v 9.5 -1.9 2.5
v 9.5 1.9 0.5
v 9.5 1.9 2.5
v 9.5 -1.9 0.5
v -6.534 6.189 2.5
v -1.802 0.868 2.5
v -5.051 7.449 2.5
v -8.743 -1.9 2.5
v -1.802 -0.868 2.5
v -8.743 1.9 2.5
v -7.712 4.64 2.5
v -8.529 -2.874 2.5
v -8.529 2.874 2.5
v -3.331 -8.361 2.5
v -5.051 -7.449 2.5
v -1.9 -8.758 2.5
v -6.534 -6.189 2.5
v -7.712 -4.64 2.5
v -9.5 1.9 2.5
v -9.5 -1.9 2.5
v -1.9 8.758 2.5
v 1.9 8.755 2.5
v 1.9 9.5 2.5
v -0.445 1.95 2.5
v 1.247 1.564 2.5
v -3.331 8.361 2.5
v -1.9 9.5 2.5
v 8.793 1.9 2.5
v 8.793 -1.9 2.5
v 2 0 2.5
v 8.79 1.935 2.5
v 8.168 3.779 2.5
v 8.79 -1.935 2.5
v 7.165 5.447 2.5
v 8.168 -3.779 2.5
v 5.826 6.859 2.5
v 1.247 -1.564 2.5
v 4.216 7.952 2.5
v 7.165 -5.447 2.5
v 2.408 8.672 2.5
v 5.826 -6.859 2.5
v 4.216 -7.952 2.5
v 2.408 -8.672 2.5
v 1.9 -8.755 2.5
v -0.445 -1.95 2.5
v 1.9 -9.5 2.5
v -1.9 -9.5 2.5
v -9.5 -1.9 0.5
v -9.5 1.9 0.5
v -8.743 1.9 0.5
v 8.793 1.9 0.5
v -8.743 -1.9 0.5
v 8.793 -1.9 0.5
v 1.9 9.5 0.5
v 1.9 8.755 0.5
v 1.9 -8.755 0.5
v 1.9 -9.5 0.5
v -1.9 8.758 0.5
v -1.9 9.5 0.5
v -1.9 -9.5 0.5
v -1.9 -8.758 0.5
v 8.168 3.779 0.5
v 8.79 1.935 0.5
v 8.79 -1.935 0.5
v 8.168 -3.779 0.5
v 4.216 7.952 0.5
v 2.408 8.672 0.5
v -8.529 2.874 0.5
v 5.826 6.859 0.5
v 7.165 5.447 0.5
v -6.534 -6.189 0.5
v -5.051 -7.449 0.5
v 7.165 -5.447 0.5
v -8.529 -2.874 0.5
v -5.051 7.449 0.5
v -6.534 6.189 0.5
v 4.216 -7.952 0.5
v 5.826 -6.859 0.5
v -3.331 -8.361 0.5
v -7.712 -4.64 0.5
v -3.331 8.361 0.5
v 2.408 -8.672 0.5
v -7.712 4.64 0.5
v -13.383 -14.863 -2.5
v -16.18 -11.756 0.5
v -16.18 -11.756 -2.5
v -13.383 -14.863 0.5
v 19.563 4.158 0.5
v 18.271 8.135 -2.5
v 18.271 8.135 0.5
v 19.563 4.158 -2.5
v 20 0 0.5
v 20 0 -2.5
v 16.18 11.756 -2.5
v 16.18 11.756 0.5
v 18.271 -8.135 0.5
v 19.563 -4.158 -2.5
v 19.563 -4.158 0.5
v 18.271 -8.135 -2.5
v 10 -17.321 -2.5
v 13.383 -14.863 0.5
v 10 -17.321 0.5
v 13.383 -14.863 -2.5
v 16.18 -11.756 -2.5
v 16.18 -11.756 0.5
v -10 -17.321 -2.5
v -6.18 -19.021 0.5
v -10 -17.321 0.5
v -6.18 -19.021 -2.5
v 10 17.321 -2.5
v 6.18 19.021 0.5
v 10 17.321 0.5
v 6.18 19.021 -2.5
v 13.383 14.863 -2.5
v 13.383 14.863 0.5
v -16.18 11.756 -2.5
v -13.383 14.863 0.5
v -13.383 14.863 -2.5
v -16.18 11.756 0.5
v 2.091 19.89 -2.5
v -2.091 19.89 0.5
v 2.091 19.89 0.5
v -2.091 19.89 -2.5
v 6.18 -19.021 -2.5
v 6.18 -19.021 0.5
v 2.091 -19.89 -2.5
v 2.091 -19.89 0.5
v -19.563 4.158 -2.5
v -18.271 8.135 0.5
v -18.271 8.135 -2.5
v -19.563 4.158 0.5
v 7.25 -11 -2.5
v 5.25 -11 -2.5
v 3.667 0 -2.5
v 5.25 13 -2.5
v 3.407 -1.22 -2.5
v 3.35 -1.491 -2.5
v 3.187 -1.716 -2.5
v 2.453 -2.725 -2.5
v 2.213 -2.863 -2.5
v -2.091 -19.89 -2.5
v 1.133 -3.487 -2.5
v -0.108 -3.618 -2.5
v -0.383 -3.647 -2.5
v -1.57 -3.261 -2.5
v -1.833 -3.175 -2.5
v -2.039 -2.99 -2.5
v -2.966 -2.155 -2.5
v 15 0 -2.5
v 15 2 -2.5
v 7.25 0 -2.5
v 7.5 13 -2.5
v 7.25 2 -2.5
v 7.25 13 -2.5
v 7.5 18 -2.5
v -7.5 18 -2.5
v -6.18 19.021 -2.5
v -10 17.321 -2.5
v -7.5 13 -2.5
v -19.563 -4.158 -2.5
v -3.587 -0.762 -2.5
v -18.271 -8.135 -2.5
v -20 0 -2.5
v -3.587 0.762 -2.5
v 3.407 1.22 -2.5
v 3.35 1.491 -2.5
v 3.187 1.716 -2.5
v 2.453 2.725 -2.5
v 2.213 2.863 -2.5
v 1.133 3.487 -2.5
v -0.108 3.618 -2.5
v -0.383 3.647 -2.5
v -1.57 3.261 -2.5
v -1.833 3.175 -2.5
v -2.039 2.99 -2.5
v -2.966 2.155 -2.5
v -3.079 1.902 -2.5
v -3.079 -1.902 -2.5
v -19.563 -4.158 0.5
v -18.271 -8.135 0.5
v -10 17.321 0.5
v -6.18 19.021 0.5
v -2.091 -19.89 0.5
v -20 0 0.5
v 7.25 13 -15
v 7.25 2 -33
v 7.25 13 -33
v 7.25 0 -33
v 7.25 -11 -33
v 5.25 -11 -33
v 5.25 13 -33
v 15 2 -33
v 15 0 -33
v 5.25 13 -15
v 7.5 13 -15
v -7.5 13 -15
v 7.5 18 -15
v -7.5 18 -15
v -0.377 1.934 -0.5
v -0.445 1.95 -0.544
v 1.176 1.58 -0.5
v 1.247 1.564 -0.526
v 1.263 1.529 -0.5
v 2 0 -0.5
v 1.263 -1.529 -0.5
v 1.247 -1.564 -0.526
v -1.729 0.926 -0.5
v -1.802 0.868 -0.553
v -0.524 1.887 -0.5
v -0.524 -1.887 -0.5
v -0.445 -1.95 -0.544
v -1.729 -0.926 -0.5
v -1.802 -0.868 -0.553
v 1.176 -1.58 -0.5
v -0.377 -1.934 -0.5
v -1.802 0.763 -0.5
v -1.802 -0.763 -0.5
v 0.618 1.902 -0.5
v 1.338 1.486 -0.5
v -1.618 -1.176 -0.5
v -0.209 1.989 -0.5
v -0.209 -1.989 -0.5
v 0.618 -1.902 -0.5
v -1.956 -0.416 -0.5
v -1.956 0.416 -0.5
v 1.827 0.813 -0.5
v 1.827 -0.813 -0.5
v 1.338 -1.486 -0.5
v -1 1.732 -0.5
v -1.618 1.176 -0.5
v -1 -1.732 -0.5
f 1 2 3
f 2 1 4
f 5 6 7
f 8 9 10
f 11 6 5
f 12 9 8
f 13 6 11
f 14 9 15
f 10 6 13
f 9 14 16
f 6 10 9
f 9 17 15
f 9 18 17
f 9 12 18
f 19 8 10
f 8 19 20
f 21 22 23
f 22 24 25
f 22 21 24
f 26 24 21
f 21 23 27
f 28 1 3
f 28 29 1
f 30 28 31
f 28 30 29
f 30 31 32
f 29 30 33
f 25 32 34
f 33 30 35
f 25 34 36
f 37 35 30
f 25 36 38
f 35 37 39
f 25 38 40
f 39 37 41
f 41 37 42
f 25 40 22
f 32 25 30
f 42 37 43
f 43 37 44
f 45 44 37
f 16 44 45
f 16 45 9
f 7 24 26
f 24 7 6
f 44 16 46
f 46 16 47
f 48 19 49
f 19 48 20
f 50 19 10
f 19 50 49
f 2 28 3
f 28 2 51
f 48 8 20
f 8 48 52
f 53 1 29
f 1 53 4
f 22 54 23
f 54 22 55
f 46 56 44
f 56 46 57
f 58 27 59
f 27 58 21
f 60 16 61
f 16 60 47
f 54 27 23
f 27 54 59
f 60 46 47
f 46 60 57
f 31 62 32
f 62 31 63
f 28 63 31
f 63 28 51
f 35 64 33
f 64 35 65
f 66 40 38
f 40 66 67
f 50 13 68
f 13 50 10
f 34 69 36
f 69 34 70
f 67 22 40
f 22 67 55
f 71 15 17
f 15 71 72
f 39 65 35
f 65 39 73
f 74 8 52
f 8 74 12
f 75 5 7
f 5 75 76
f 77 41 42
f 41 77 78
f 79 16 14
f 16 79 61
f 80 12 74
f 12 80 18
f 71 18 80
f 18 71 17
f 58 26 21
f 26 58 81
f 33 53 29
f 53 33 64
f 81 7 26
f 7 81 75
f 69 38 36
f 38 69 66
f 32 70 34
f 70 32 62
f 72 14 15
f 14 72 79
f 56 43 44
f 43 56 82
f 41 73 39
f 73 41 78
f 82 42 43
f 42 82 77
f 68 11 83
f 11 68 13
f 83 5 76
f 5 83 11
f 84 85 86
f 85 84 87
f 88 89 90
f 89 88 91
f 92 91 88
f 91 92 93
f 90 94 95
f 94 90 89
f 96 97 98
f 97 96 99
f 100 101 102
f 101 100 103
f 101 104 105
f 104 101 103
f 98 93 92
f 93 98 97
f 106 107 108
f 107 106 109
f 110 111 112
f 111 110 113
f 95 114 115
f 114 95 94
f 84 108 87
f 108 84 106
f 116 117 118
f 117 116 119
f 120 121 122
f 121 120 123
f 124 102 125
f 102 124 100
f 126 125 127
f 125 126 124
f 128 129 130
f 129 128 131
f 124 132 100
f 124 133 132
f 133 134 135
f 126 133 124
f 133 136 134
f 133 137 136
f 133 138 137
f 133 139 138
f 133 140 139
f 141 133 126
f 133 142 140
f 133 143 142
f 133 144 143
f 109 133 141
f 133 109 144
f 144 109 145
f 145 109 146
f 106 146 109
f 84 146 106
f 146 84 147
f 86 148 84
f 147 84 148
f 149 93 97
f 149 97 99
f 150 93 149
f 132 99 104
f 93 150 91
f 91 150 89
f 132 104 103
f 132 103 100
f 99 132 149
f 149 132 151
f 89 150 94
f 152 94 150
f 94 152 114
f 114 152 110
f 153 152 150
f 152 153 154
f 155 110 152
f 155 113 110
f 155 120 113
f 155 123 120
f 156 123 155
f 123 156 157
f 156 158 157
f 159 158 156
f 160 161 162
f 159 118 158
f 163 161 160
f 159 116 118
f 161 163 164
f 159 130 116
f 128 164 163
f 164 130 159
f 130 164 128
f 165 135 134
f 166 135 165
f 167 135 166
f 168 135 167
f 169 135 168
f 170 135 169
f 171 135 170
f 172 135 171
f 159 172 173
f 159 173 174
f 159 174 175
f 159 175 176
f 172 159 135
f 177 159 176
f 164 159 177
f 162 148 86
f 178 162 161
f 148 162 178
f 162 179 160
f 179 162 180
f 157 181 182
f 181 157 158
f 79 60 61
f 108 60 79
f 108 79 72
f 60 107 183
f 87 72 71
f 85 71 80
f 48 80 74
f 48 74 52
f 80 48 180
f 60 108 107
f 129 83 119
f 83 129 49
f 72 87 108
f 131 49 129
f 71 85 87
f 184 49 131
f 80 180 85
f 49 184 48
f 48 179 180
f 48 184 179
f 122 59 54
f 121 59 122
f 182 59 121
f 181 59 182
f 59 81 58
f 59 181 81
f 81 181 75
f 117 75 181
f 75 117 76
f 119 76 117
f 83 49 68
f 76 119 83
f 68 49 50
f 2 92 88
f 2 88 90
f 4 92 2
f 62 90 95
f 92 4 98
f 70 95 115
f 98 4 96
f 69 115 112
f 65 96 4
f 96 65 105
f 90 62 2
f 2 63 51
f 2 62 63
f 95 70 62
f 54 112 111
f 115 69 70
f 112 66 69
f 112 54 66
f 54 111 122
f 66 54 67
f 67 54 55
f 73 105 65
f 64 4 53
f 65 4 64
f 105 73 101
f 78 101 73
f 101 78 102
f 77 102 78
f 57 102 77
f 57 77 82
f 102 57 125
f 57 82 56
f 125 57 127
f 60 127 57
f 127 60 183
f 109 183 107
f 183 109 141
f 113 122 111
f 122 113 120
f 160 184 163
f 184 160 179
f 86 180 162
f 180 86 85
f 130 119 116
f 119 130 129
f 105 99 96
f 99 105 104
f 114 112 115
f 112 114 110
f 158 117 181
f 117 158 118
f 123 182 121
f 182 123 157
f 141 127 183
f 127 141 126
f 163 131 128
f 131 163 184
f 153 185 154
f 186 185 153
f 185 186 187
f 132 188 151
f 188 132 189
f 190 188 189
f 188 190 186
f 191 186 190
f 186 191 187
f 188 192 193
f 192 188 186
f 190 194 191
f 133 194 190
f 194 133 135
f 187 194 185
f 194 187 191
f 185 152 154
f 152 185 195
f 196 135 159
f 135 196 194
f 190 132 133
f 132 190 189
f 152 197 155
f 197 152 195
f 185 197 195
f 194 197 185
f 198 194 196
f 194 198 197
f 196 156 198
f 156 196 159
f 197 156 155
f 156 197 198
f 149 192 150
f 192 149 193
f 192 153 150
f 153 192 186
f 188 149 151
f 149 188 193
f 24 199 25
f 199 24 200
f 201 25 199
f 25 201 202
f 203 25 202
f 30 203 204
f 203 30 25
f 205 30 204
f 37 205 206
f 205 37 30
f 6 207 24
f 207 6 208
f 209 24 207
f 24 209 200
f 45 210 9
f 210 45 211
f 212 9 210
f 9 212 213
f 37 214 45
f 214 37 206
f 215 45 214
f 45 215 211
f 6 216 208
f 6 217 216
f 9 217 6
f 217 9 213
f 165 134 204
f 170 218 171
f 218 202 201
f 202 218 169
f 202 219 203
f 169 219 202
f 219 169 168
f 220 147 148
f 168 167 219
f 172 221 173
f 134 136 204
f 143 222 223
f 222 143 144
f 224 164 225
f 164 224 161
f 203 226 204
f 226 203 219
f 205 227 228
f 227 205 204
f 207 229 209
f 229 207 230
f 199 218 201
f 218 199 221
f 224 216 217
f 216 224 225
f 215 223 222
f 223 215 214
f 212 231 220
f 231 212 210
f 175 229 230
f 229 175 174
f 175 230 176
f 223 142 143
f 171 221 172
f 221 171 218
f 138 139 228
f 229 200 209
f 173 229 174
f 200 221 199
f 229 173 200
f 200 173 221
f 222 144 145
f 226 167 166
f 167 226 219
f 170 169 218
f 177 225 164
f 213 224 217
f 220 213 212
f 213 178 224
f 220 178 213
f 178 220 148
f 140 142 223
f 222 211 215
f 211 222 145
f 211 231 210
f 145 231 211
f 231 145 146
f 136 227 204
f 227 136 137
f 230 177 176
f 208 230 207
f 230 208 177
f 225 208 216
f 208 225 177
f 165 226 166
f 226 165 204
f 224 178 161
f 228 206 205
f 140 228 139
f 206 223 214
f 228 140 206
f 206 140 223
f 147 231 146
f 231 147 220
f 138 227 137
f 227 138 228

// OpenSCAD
metalThickness = 2.5;
innerBackPlate = 3;

difference(){
    
    union(){
        //Cross in key hole
        translate([-19/2,-3.8/2,0])
            cube([19,3.8,metalThickness]);
        translate([-3.8/2,-19/2,0])
            cube ([3.8,19,metalThickness]);
       
        //cylinder in key hole
        cylinder(metalThickness, 18/2, 18/2);
        
        //backplate
        translate([0,0,metalThickness*-1])
            cylinder(innerBackPlate, 20, 20);
        
        //outer plug
        //translate([0,0,metalThickness+.4])
            //cylinder(15, 15, 15);
        
        
        //servo right side wall
        translate([(12.5/2)-1,-11,-33])
            cube ([2,24,33]);
        
        //servo bottom side screw block
        translate([-15/2,13,-15])
            cube ([15,5,15]);
            
            
        //servo right side support
        translate([7,0,-33])
            cube ([8,2,33]);
            
    }
    
    //Screw Cutout
    translate([0,0,metalThickness*-1])
        cylinder(10, 2, 2);
    translate([0,0,metalThickness*-1-1])
        cylinder(innerBackPlate, 4.5, 2);
}
